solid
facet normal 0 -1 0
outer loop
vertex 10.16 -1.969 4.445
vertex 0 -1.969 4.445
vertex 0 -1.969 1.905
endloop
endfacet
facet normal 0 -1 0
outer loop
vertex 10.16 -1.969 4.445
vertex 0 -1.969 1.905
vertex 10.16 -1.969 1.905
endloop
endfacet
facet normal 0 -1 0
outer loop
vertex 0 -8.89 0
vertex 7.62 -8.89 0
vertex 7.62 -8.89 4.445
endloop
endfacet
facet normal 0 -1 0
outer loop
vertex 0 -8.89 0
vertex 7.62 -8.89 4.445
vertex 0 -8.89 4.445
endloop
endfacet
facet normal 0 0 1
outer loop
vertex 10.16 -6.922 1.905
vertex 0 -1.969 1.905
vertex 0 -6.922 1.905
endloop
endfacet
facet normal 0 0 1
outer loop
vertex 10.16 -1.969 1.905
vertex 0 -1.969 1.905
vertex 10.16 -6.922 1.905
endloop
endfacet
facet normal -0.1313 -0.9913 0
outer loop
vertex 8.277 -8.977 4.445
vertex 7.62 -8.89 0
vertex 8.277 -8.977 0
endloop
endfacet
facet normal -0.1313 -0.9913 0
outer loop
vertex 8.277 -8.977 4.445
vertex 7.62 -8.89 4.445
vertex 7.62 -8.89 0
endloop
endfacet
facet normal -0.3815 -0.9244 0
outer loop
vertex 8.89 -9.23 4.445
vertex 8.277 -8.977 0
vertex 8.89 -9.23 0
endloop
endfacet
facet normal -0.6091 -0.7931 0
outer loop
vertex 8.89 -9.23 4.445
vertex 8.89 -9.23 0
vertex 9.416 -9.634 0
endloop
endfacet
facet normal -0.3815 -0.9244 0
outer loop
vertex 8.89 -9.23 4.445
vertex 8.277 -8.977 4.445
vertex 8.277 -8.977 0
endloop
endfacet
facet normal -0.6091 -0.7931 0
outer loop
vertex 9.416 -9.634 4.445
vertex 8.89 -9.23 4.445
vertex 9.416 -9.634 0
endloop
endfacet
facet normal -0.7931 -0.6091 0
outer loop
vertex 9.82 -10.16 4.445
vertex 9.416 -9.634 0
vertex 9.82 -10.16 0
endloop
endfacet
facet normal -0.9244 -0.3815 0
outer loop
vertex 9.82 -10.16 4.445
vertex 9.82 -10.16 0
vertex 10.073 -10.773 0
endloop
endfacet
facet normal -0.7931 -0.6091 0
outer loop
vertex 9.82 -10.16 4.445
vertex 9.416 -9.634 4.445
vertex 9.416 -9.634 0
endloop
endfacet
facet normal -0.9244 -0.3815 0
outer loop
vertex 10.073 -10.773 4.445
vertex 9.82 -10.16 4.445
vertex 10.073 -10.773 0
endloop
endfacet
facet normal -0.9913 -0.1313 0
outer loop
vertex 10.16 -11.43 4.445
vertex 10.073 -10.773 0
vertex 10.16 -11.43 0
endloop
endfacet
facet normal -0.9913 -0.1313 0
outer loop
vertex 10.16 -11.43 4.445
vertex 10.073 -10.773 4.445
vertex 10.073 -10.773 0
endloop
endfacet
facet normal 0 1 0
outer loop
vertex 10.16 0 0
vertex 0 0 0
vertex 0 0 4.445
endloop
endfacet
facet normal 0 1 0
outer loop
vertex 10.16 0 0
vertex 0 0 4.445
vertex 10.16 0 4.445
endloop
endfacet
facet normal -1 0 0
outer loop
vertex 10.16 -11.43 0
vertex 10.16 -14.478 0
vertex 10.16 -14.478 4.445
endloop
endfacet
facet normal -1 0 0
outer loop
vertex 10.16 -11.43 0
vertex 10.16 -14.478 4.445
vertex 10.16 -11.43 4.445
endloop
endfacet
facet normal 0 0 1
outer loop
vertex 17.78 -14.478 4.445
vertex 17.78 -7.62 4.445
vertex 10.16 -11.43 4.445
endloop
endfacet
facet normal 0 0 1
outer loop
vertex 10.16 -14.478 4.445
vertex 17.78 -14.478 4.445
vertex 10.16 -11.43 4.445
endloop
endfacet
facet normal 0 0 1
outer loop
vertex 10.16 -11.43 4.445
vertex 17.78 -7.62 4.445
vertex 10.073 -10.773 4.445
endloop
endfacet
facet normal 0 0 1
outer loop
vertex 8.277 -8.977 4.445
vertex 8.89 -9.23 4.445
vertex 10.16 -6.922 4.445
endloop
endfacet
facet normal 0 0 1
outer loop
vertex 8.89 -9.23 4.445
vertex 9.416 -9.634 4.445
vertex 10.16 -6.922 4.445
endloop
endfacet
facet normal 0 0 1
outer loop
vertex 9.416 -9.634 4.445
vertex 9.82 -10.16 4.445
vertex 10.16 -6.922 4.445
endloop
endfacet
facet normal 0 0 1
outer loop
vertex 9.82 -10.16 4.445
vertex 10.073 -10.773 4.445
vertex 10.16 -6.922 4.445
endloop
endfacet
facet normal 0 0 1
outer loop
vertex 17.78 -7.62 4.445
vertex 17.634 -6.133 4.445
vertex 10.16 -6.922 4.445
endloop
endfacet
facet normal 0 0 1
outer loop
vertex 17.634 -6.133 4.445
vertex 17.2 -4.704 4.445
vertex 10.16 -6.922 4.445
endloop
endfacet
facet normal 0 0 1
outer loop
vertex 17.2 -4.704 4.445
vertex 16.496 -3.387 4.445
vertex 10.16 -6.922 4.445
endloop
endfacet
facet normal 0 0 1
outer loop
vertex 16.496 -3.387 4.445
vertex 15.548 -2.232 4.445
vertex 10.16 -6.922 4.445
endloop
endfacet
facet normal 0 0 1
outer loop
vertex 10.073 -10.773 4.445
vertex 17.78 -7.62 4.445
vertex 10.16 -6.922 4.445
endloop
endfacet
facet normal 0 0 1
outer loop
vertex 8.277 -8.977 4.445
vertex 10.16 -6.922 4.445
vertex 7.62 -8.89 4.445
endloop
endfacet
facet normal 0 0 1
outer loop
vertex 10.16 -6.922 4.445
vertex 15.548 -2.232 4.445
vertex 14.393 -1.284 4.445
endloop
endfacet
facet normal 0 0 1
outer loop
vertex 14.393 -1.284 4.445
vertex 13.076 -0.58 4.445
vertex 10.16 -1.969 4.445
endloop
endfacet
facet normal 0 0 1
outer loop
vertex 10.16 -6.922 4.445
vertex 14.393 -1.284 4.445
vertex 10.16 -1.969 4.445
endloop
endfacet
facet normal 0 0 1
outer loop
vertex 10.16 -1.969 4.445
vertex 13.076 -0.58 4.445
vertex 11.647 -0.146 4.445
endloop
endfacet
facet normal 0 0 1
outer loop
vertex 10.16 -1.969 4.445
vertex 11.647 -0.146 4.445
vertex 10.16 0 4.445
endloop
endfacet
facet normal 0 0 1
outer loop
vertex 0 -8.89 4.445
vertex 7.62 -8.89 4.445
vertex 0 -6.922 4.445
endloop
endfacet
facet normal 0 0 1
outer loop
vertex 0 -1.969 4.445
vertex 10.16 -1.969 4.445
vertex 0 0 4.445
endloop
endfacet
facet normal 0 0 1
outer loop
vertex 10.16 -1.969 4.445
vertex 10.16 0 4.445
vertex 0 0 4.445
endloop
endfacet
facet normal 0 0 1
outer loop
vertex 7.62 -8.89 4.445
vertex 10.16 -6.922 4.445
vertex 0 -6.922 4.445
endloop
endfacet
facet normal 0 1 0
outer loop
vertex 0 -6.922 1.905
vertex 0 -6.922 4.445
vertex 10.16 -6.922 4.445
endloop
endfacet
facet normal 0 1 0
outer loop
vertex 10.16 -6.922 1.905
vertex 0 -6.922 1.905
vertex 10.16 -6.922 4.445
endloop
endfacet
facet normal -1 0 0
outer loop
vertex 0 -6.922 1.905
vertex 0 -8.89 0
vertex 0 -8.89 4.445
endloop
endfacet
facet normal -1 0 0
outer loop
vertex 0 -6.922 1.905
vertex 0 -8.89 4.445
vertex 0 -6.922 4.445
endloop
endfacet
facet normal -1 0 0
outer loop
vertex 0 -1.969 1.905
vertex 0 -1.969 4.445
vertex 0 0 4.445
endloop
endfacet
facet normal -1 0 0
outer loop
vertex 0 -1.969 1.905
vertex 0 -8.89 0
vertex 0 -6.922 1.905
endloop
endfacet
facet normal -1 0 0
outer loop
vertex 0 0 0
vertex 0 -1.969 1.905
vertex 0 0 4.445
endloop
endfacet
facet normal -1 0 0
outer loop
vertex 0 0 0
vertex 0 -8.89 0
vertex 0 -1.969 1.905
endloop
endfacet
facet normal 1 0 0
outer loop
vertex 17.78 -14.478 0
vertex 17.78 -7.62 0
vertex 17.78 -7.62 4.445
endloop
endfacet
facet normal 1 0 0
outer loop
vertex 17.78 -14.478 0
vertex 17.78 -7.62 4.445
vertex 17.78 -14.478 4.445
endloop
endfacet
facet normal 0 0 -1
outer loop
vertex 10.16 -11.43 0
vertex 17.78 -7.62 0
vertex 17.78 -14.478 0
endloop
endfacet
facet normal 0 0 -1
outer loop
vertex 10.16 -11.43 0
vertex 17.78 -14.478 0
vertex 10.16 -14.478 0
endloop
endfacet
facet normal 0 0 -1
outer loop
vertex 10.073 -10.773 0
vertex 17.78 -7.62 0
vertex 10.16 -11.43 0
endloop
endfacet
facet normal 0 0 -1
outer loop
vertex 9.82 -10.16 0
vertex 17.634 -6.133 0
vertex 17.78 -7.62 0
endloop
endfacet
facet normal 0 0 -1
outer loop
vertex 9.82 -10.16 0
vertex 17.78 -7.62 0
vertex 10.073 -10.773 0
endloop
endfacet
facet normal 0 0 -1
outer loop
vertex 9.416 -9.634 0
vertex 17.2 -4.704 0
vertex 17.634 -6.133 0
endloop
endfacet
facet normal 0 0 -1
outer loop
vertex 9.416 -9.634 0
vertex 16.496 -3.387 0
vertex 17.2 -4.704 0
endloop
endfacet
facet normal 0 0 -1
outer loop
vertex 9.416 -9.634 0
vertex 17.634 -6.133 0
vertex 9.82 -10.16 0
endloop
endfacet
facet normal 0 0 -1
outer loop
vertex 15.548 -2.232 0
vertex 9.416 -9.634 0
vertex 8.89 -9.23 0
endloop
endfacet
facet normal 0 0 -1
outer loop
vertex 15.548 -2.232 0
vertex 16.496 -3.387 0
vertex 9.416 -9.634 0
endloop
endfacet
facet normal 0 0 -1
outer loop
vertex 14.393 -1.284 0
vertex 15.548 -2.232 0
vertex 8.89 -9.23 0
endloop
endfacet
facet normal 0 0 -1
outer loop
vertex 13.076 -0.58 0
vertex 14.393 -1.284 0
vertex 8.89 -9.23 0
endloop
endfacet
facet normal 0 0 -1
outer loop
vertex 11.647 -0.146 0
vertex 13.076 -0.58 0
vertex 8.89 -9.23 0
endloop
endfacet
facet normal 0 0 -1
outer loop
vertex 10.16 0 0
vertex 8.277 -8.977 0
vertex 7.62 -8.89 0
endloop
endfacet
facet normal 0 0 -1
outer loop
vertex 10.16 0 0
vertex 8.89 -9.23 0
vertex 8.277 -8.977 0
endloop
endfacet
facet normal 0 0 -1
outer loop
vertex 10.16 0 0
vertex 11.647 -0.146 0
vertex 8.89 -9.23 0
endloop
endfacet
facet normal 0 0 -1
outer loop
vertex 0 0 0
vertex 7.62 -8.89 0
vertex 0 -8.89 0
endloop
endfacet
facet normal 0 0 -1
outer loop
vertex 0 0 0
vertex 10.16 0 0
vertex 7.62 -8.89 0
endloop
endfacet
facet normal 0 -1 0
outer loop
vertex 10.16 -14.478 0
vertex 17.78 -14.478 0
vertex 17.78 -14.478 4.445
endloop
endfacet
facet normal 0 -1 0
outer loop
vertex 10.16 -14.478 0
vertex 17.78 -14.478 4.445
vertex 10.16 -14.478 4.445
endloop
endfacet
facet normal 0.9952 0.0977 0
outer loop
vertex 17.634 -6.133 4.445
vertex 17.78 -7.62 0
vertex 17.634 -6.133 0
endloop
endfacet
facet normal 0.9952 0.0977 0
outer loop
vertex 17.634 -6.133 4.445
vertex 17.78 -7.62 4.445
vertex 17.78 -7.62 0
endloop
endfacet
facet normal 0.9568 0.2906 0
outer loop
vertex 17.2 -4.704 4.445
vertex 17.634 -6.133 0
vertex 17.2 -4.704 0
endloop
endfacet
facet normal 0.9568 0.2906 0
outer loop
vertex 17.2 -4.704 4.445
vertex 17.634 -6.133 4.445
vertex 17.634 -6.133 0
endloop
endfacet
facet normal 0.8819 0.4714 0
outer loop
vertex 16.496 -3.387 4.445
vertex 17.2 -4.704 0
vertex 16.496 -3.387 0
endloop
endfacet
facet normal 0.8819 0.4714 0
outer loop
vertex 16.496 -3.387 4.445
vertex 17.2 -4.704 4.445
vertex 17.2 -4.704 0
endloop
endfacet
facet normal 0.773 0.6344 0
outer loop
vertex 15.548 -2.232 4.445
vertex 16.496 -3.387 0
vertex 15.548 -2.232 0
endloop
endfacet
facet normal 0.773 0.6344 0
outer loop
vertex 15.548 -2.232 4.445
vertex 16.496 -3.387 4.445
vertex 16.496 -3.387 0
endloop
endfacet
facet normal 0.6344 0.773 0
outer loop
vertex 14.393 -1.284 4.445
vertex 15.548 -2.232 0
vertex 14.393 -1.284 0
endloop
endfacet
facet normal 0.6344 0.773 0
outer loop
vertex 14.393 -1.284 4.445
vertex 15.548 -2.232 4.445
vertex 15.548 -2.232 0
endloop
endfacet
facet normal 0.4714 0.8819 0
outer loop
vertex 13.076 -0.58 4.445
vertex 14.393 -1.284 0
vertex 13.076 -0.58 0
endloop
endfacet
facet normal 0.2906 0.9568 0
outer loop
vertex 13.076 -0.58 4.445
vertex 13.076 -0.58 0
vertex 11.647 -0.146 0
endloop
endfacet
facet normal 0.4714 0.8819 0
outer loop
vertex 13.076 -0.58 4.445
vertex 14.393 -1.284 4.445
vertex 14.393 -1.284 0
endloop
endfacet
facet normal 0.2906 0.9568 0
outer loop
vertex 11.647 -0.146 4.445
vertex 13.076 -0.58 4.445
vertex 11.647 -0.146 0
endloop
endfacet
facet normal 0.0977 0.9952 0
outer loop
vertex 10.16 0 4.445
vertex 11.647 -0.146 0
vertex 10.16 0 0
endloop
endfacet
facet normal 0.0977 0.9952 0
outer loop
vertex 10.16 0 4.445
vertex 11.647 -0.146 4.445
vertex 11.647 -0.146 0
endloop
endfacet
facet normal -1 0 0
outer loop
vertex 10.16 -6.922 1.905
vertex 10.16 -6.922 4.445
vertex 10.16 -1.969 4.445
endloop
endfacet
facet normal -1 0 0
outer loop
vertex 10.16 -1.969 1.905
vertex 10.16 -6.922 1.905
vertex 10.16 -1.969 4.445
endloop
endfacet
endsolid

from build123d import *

# Parameters (mm, degrees)
BOSS_EXTRUDE1_DEPTH = 4.445
SKETCH2_W           = 10.16
SKETCH2_H           = 4.953
CUT_EXTRUDE1_DEPTH  = 2.54
FILLET1_R           = 2.54
FILLET2_R           = 7.62


with BuildPart() as part:
    # Sketch1 → Boss-Extrude1 (new body)
    with BuildSketch(Plane.XY):
        Polygon((0, 0), (17.78, 0), (17.78, -14.478), (10.16, -14.478), (10.16, -8.89), (0, -8.89), align=None)
    extrude(amount=BOSS_EXTRUDE1_DEPTH)

    # Sketch2 → Cut-Extrude1 (cut)
    with BuildSketch(Plane.XY.offset(4.445)):
        with Locations((5.08, -4.445)):
            Rectangle(SKETCH2_W, SKETCH2_H)
    extrude(amount=-CUT_EXTRUDE1_DEPTH, mode=Mode.SUBTRACT)

    # Fillet1
    fillet1_edges = [part.edges().sort_by_distance(p)[0] for p in [
        (10.16, -8.89, 2.2225),
    ]]
    fillet(fillet1_edges, radius=FILLET1_R)

    # Fillet2
    fillet2_edges = [part.edges().sort_by_distance(p)[0] for p in [
        (17.78, 0, 2.2225),
    ]]
    fillet(fillet2_edges, radius=FILLET2_R)


solid = part.part
